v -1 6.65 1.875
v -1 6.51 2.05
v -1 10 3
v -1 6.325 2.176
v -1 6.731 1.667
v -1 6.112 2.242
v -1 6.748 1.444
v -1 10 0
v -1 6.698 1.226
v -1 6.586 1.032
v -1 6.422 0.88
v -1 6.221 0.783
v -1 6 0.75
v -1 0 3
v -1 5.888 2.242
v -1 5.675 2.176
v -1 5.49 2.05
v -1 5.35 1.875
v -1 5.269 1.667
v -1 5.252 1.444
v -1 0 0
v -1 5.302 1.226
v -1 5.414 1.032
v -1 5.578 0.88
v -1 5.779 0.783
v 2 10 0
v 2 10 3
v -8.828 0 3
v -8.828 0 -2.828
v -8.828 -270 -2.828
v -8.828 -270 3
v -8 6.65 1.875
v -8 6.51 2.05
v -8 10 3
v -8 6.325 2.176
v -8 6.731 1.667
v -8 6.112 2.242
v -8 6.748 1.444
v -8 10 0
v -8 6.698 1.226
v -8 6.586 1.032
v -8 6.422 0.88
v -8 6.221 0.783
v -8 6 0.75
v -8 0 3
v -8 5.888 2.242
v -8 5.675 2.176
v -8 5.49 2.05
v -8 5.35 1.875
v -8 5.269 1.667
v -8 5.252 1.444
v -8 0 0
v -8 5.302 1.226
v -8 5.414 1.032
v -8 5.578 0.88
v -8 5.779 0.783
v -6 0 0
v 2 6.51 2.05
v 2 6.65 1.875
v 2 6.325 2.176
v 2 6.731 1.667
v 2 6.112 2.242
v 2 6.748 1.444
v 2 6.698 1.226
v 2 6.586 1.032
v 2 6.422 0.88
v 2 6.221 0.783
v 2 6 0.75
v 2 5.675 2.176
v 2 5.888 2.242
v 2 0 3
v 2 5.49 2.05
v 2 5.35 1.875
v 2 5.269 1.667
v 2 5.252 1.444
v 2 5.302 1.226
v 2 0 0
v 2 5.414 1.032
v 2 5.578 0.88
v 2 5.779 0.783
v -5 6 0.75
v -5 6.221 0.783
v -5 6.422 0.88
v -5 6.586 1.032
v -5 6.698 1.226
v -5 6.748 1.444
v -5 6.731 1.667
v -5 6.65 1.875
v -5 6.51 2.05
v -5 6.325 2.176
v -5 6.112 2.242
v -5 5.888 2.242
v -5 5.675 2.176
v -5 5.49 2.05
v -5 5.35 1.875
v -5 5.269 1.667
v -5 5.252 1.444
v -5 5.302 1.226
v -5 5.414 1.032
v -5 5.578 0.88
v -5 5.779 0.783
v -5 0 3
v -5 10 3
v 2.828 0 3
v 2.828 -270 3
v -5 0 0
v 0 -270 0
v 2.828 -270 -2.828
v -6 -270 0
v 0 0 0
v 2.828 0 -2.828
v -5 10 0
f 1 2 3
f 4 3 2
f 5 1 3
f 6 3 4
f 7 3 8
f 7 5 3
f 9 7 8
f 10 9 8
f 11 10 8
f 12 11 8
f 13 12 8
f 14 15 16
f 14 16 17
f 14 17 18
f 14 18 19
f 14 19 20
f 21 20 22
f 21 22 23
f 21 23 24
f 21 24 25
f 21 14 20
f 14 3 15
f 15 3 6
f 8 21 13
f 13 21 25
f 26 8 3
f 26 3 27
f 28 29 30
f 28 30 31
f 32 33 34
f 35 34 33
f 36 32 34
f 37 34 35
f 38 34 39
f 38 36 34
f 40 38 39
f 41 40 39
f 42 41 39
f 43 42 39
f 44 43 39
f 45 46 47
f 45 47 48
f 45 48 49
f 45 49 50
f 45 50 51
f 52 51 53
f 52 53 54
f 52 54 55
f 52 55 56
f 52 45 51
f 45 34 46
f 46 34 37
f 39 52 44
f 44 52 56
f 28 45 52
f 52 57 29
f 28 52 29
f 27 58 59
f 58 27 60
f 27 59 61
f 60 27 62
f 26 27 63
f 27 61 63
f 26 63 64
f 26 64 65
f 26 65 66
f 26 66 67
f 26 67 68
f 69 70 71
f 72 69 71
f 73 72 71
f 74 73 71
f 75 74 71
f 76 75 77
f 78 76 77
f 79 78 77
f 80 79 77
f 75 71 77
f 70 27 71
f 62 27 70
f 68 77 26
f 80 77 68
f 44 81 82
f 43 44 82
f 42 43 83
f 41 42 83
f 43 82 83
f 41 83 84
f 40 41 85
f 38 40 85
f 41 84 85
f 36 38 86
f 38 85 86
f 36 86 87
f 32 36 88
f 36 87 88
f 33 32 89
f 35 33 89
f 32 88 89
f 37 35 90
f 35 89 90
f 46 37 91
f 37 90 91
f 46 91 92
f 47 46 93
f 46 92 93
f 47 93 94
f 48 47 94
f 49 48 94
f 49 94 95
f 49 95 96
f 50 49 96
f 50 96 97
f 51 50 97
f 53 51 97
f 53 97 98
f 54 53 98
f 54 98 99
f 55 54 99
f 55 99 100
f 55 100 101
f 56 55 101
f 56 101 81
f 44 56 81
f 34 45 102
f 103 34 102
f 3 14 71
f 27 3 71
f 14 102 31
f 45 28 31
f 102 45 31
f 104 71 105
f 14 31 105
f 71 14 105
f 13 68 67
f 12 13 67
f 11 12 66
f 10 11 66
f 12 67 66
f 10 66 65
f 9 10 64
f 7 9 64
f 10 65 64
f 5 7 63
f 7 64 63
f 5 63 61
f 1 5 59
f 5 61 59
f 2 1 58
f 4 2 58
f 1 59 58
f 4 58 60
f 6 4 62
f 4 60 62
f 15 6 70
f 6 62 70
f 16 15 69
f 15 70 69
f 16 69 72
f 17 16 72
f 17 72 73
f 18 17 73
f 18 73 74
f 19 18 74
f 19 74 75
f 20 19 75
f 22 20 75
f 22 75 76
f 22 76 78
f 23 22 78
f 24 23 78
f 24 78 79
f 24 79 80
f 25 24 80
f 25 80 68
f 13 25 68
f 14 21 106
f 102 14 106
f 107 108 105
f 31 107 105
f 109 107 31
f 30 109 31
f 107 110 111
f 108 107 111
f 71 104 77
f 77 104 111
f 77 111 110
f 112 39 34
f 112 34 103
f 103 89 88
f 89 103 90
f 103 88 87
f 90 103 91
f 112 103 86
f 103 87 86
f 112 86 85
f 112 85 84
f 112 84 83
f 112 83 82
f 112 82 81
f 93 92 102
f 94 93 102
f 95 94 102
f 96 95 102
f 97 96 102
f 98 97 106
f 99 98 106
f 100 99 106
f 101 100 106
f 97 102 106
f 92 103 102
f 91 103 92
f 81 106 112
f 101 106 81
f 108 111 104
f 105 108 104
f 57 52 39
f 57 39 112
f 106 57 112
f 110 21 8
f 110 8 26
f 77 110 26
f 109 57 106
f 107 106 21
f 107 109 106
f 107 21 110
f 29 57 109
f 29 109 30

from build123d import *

# Parameters (mm, degrees)
SKETCH2_W           = 6
SKETCH2_H           = 270
BOSS_EXTRUDE1_DEPTH = 3
BOSS_EXTRUDE2_DEPTH = 270
SKETCH5_W           = 3
SKETCH5_H           = 3
BOSS_EXTRUDE3_DEPTH = 10
SKETCH6_R           = 0.75
CUT_EXTRUDE1_DEPTH  = 40


with BuildPart() as part:
    # Sketch2 → Boss-Extrude1 (new body)
    with BuildSketch(Plane.XY):
        with Locations((-3, -135)):
            Rectangle(SKETCH2_W, SKETCH2_H)
    extrude(amount=BOSS_EXTRUDE1_DEPTH)

    # Sketch4 → Boss-Extrude2 (add)
    with BuildSketch(Plane(origin=(0, -270, 0), x_dir=(-1, 0, 0), z_dir=(0, -1, 0))):
        Polygon((0, 0), (-2.828427125, 2.828427125), (-2.828427125, -3), (0, -3), align=None)
        Polygon((8.828427125, -3), (6, -3), (6, 0), (8.828427125, 2.828427125), align=None)
    extrude(amount=-BOSS_EXTRUDE2_DEPTH)

    # Sketch5 → Boss-Extrude3 (add)
    with BuildSketch(Plane(origin=(0, 0, 0), x_dir=(1, 0, 0), z_dir=(0, 1, 0))):
        with Locations((-6.5, -1.5)):
            Rectangle(SKETCH5_W, SKETCH5_H)
        with Locations((0.5, -1.5)):
            Rectangle(SKETCH5_W, SKETCH5_H)
    extrude(amount=BOSS_EXTRUDE3_DEPTH)

    # Sketch6 → Cut-Extrude1 (cut)
    with BuildSketch(Plane(origin=(2, 0, 0), x_dir=(0, 0, -1), z_dir=(1, 0, 0))):
        with Locations((-1.5, 6)):
            Circle(SKETCH6_R)
    extrude(amount=-CUT_EXTRUDE1_DEPTH, mode=Mode.SUBTRACT)


solid = part.part
